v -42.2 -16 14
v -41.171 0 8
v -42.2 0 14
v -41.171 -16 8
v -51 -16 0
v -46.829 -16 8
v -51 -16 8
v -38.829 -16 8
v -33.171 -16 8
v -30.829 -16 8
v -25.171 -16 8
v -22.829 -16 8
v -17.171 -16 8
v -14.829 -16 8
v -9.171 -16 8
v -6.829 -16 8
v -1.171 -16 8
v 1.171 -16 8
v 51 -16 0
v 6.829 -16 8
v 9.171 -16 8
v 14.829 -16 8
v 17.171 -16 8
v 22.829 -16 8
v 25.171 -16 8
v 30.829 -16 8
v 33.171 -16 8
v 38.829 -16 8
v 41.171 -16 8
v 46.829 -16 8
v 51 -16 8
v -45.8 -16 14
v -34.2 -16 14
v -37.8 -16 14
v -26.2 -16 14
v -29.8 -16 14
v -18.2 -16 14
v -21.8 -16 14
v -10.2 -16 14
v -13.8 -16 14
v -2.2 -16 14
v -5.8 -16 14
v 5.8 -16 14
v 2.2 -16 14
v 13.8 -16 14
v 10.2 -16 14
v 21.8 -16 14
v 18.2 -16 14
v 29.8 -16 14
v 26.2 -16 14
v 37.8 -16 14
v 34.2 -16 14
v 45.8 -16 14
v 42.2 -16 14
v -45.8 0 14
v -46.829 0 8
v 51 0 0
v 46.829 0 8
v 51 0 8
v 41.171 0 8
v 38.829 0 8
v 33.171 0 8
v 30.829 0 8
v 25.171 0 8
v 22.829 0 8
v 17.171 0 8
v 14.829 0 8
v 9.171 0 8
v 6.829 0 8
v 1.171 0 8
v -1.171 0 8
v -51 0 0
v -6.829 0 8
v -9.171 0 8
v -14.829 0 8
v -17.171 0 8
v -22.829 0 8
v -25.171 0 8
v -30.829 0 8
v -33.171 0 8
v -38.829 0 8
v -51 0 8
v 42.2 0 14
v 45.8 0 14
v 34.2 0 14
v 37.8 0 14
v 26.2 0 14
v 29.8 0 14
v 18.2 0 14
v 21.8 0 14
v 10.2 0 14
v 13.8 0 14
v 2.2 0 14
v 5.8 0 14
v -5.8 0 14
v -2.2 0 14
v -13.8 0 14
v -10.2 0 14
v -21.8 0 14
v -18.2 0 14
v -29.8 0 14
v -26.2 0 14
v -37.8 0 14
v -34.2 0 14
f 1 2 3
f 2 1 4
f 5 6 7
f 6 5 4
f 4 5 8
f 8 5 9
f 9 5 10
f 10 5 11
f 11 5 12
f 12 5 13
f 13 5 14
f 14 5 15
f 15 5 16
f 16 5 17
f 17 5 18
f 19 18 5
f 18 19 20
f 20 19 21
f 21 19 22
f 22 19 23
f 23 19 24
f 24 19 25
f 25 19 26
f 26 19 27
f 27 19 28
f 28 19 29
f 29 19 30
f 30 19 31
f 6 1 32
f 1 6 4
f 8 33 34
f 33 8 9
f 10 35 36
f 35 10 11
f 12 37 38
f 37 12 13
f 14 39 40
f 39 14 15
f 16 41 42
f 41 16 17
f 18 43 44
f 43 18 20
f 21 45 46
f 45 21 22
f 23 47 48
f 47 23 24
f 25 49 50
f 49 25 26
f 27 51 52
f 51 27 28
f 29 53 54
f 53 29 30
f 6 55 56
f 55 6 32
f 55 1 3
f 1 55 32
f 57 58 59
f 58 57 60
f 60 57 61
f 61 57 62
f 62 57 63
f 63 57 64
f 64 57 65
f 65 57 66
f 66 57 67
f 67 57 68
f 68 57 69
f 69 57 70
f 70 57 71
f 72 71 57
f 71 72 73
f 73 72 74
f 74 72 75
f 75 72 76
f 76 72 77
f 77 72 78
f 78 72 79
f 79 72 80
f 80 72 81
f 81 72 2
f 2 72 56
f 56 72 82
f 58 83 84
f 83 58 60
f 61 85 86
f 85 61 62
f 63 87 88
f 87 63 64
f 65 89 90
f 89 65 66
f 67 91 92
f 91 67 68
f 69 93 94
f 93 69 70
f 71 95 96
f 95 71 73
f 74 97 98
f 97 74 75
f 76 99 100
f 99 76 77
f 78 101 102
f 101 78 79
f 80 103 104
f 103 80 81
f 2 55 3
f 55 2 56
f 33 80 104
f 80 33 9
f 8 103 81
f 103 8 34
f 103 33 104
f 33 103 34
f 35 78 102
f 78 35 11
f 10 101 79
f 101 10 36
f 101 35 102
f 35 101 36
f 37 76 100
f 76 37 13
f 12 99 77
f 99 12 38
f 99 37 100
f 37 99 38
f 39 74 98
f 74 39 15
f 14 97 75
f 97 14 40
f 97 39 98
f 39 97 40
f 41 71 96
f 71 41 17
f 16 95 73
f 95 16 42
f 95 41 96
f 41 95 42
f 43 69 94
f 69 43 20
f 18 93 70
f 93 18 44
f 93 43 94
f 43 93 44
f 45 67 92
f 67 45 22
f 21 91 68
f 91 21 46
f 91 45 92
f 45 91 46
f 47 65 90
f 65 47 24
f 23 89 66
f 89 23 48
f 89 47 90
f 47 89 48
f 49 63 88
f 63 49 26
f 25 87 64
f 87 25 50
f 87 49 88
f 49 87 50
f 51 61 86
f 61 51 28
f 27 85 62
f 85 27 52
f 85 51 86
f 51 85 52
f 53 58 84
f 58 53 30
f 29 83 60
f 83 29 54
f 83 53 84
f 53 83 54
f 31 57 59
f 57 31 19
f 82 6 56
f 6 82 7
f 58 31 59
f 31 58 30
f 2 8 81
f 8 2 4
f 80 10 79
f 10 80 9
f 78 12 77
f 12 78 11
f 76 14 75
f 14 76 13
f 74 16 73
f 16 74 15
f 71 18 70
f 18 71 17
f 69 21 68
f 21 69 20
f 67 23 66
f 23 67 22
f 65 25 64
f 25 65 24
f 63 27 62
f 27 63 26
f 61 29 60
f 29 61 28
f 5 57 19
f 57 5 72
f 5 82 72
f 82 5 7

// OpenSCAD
$fn = 32;

// ----------------------------------------------------------------------
// Toothed rack, 12 teeth
// 8 mm pitch, 6 mm teeth
// ----------------------------------------------------------------------

// --- parameters (mm) ---
bar_w = 16;     // bar width (Y)
bar_h = 8;      // bar height (Z)
teeth = 12;     // number of teeth
pitch = 8;      // tooth pitch
tooth_h = 6;    // tooth height above the bar
root_w = 6;     // tooth width at the root
crest_w = 3.6;  // tooth width at the crest

// --- derived feature positions (mm) ---
span = (teeth - 1) * pitch;  // = 88   distance between the outer teeth
bar_l = span + root_w + 8;   // = 102   bar length: teeth plus 4 mm at each end
tooth_x = -span / 2;         // = -44   X of the first tooth
height = bar_h + tooth_h;    // = 14   overall height
feature_centers = [
  [tooth_x + 0 * pitch, -bar_w / 2],
  [tooth_x + 1 * pitch, -bar_w / 2],
  [tooth_x + 2 * pitch, -bar_w / 2],
  [tooth_x + 3 * pitch, -bar_w / 2],
  [tooth_x + 4 * pitch, -bar_w / 2],
  [tooth_x + 5 * pitch, -bar_w / 2],
  [tooth_x + 6 * pitch, -bar_w / 2],
  [tooth_x + 7 * pitch, -bar_w / 2],
  [tooth_x + 8 * pitch, -bar_w / 2],
  [tooth_x + 9 * pitch, -bar_w / 2],
  [tooth_x + 10 * pitch, -bar_w / 2],
  [tooth_x + 11 * pitch, -bar_w / 2]
];   // tooth centre line, drives the tooth loop

// bar with a rack of teeth, one extruded trapezoium per centre
module rack_tooth() {
  linear_extrude(height = bar_w)
    polygon(points = [
      [0, 0],
      [root_w, 0],
      [root_w / 2 + crest_w / 2, tooth_h + 1],
      [root_w / 2 - crest_w / 2, tooth_h + 1]
    ]);
}

union() {
  translate([-bar_l / 2, -bar_w, 0]) cube([bar_l, bar_w, bar_h]);
  for (centre = feature_centers)
    translate([centre[0] - root_w / 2, 0, bar_h - 1]) rotate([90, 0, 0]) rack_tooth();
}
